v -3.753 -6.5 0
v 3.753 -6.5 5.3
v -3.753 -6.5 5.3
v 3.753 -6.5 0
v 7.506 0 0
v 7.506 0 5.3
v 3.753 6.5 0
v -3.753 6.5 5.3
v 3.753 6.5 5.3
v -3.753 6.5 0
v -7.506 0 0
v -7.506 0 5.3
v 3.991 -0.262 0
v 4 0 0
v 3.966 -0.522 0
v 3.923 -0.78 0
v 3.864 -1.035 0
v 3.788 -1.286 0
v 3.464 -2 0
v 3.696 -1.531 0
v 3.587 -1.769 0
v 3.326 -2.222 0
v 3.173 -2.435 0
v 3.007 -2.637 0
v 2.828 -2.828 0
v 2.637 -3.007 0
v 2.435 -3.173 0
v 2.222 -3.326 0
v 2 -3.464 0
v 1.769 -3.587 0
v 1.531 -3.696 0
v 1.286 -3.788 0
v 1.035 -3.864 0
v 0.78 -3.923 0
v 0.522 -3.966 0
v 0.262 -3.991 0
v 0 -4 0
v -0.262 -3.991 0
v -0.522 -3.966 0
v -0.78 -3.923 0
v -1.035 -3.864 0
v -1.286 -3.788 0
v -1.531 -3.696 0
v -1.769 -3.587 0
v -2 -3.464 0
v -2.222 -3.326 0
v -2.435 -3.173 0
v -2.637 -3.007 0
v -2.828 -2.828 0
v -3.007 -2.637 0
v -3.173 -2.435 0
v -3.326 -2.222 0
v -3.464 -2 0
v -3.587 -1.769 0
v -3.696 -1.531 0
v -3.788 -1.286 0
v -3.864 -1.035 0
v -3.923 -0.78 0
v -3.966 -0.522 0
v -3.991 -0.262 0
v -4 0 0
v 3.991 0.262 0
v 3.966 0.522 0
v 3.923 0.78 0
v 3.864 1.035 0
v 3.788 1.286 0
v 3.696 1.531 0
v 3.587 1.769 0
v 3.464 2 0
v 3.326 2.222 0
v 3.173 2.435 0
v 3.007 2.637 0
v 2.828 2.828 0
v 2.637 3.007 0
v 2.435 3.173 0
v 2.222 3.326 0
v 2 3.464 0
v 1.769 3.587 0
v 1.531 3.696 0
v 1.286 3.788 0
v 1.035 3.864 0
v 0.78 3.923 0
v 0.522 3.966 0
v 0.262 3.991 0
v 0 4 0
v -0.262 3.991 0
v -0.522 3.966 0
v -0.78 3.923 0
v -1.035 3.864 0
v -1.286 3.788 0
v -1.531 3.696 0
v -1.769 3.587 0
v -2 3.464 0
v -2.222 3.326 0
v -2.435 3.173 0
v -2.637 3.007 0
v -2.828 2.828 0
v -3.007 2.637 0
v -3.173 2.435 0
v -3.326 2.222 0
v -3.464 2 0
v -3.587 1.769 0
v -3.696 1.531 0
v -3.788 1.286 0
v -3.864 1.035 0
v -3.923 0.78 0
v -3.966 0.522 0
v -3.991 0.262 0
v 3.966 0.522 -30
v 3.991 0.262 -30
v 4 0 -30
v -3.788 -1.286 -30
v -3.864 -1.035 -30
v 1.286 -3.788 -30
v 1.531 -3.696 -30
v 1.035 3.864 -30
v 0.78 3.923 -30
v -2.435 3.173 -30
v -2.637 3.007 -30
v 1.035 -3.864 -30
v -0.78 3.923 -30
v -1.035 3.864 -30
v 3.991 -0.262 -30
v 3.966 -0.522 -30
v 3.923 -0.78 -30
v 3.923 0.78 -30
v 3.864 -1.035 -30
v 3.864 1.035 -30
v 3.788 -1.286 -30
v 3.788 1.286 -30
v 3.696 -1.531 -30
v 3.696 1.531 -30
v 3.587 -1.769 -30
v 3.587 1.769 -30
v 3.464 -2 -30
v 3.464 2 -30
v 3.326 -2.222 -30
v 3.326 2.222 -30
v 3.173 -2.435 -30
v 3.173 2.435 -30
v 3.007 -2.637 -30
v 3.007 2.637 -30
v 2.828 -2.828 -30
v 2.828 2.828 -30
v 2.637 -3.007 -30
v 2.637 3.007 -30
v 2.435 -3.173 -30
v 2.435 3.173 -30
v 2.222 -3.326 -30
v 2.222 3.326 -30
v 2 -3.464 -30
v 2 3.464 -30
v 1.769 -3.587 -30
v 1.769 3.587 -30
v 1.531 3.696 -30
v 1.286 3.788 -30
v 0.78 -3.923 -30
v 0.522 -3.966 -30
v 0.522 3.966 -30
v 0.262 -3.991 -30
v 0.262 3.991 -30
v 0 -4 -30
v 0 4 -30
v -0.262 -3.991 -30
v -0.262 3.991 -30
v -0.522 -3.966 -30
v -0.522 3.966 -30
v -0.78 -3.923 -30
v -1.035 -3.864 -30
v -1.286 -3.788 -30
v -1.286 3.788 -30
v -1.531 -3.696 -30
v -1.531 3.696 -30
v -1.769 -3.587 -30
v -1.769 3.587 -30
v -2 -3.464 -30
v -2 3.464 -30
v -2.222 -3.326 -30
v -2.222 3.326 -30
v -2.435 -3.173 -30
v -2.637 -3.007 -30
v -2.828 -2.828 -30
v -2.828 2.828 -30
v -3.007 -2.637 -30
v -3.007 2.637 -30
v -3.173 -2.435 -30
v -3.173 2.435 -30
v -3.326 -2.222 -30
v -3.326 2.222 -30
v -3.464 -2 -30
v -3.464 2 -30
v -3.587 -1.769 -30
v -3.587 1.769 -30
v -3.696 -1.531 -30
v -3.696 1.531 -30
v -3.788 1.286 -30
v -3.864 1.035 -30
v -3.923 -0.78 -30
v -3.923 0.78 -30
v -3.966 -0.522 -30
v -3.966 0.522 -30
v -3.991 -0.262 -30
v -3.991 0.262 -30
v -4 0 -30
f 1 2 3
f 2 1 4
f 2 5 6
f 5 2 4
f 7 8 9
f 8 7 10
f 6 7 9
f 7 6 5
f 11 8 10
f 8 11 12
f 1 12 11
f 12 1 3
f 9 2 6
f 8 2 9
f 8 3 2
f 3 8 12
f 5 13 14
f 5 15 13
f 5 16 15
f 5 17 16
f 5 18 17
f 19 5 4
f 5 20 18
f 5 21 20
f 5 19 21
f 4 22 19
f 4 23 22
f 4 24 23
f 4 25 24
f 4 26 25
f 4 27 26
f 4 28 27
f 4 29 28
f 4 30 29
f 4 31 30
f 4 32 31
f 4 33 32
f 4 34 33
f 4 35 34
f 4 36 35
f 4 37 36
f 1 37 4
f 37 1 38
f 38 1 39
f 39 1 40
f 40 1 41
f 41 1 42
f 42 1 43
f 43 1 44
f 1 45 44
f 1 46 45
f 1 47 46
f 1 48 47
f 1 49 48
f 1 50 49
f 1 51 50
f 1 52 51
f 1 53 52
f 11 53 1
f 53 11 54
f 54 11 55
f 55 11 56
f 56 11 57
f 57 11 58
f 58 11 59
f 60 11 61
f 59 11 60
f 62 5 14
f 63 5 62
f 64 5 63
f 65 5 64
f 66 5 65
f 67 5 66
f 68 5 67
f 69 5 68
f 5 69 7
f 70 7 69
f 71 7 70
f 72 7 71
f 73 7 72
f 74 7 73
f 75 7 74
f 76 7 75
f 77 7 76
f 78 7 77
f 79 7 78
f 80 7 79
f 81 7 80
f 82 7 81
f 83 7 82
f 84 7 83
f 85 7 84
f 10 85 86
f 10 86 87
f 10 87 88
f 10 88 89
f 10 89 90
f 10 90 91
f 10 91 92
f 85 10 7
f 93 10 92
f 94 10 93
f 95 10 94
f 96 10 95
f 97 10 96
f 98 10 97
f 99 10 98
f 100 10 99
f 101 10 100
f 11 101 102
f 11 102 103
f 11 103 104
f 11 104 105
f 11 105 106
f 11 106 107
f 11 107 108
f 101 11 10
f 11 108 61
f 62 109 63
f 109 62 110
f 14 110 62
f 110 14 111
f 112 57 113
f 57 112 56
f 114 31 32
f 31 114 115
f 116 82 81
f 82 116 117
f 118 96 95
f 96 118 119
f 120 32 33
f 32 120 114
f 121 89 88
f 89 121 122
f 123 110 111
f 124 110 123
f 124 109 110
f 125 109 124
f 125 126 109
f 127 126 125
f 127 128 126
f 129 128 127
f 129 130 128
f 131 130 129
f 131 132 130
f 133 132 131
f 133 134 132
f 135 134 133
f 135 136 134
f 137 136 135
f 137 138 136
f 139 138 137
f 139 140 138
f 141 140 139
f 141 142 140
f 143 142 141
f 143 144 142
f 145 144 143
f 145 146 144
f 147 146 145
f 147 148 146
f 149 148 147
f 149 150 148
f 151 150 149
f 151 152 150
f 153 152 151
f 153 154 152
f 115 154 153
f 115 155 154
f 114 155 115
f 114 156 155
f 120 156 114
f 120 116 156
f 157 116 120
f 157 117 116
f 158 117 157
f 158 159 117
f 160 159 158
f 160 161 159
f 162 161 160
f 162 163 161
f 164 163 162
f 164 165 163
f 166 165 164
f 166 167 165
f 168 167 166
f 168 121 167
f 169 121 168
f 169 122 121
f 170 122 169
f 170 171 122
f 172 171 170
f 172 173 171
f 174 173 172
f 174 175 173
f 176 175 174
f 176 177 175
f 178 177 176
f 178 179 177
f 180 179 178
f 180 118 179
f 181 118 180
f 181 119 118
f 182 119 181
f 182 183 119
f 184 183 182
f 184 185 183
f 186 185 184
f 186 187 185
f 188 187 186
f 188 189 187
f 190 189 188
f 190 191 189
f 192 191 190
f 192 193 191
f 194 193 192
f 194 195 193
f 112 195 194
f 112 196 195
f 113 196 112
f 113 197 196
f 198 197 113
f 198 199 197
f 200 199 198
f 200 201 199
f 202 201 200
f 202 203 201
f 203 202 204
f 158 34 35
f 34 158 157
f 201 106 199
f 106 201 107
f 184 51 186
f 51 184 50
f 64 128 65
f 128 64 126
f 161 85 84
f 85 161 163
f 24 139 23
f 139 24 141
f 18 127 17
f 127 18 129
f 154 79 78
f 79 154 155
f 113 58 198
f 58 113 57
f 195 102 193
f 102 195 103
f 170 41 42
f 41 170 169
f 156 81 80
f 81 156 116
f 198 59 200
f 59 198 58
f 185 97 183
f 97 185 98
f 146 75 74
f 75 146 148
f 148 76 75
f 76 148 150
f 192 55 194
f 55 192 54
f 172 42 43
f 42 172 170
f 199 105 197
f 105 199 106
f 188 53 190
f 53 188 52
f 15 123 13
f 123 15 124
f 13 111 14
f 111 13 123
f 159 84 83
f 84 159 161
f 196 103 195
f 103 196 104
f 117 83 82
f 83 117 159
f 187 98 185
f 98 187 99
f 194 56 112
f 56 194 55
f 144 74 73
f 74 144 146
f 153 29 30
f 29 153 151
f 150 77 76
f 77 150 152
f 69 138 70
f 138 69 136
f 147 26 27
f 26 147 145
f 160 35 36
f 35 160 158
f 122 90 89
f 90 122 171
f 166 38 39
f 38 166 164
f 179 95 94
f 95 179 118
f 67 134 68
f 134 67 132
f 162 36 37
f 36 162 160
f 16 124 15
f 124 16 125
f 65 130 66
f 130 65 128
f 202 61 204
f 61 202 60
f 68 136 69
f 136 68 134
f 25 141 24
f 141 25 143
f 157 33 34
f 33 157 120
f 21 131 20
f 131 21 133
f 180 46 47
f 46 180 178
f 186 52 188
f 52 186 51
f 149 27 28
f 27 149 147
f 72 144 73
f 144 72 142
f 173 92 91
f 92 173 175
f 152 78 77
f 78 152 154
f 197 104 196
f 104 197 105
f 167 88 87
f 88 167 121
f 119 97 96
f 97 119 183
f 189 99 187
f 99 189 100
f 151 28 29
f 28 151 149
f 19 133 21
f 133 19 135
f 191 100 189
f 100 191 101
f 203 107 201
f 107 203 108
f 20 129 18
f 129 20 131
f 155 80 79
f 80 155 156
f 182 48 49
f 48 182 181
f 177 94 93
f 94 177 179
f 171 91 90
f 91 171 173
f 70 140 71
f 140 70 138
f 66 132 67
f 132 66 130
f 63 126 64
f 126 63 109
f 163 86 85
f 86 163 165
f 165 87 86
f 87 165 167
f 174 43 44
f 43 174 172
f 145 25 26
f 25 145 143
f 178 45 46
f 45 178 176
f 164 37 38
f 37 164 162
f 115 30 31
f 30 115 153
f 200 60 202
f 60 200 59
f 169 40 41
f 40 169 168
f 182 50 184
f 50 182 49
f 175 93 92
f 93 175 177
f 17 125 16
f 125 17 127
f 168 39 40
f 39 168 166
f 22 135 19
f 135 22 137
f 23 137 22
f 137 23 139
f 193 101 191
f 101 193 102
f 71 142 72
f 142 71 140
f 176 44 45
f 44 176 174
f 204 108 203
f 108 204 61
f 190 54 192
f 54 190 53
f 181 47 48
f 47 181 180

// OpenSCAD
head_across_flats = 13;
head_height      = 5.3;
shank_diameter   = 8;
shank_length     = 30;

$fn = 96;

union() {
    cylinder(
        h = head_height,
        r = head_across_flats / (2 * cos(30)),
        center = false,
        $fn = 6
    );

    translate([0, 0, -shank_length])
        cylinder(
            h = shank_length,
            d = shank_diameter,
            center = false
        );
}
